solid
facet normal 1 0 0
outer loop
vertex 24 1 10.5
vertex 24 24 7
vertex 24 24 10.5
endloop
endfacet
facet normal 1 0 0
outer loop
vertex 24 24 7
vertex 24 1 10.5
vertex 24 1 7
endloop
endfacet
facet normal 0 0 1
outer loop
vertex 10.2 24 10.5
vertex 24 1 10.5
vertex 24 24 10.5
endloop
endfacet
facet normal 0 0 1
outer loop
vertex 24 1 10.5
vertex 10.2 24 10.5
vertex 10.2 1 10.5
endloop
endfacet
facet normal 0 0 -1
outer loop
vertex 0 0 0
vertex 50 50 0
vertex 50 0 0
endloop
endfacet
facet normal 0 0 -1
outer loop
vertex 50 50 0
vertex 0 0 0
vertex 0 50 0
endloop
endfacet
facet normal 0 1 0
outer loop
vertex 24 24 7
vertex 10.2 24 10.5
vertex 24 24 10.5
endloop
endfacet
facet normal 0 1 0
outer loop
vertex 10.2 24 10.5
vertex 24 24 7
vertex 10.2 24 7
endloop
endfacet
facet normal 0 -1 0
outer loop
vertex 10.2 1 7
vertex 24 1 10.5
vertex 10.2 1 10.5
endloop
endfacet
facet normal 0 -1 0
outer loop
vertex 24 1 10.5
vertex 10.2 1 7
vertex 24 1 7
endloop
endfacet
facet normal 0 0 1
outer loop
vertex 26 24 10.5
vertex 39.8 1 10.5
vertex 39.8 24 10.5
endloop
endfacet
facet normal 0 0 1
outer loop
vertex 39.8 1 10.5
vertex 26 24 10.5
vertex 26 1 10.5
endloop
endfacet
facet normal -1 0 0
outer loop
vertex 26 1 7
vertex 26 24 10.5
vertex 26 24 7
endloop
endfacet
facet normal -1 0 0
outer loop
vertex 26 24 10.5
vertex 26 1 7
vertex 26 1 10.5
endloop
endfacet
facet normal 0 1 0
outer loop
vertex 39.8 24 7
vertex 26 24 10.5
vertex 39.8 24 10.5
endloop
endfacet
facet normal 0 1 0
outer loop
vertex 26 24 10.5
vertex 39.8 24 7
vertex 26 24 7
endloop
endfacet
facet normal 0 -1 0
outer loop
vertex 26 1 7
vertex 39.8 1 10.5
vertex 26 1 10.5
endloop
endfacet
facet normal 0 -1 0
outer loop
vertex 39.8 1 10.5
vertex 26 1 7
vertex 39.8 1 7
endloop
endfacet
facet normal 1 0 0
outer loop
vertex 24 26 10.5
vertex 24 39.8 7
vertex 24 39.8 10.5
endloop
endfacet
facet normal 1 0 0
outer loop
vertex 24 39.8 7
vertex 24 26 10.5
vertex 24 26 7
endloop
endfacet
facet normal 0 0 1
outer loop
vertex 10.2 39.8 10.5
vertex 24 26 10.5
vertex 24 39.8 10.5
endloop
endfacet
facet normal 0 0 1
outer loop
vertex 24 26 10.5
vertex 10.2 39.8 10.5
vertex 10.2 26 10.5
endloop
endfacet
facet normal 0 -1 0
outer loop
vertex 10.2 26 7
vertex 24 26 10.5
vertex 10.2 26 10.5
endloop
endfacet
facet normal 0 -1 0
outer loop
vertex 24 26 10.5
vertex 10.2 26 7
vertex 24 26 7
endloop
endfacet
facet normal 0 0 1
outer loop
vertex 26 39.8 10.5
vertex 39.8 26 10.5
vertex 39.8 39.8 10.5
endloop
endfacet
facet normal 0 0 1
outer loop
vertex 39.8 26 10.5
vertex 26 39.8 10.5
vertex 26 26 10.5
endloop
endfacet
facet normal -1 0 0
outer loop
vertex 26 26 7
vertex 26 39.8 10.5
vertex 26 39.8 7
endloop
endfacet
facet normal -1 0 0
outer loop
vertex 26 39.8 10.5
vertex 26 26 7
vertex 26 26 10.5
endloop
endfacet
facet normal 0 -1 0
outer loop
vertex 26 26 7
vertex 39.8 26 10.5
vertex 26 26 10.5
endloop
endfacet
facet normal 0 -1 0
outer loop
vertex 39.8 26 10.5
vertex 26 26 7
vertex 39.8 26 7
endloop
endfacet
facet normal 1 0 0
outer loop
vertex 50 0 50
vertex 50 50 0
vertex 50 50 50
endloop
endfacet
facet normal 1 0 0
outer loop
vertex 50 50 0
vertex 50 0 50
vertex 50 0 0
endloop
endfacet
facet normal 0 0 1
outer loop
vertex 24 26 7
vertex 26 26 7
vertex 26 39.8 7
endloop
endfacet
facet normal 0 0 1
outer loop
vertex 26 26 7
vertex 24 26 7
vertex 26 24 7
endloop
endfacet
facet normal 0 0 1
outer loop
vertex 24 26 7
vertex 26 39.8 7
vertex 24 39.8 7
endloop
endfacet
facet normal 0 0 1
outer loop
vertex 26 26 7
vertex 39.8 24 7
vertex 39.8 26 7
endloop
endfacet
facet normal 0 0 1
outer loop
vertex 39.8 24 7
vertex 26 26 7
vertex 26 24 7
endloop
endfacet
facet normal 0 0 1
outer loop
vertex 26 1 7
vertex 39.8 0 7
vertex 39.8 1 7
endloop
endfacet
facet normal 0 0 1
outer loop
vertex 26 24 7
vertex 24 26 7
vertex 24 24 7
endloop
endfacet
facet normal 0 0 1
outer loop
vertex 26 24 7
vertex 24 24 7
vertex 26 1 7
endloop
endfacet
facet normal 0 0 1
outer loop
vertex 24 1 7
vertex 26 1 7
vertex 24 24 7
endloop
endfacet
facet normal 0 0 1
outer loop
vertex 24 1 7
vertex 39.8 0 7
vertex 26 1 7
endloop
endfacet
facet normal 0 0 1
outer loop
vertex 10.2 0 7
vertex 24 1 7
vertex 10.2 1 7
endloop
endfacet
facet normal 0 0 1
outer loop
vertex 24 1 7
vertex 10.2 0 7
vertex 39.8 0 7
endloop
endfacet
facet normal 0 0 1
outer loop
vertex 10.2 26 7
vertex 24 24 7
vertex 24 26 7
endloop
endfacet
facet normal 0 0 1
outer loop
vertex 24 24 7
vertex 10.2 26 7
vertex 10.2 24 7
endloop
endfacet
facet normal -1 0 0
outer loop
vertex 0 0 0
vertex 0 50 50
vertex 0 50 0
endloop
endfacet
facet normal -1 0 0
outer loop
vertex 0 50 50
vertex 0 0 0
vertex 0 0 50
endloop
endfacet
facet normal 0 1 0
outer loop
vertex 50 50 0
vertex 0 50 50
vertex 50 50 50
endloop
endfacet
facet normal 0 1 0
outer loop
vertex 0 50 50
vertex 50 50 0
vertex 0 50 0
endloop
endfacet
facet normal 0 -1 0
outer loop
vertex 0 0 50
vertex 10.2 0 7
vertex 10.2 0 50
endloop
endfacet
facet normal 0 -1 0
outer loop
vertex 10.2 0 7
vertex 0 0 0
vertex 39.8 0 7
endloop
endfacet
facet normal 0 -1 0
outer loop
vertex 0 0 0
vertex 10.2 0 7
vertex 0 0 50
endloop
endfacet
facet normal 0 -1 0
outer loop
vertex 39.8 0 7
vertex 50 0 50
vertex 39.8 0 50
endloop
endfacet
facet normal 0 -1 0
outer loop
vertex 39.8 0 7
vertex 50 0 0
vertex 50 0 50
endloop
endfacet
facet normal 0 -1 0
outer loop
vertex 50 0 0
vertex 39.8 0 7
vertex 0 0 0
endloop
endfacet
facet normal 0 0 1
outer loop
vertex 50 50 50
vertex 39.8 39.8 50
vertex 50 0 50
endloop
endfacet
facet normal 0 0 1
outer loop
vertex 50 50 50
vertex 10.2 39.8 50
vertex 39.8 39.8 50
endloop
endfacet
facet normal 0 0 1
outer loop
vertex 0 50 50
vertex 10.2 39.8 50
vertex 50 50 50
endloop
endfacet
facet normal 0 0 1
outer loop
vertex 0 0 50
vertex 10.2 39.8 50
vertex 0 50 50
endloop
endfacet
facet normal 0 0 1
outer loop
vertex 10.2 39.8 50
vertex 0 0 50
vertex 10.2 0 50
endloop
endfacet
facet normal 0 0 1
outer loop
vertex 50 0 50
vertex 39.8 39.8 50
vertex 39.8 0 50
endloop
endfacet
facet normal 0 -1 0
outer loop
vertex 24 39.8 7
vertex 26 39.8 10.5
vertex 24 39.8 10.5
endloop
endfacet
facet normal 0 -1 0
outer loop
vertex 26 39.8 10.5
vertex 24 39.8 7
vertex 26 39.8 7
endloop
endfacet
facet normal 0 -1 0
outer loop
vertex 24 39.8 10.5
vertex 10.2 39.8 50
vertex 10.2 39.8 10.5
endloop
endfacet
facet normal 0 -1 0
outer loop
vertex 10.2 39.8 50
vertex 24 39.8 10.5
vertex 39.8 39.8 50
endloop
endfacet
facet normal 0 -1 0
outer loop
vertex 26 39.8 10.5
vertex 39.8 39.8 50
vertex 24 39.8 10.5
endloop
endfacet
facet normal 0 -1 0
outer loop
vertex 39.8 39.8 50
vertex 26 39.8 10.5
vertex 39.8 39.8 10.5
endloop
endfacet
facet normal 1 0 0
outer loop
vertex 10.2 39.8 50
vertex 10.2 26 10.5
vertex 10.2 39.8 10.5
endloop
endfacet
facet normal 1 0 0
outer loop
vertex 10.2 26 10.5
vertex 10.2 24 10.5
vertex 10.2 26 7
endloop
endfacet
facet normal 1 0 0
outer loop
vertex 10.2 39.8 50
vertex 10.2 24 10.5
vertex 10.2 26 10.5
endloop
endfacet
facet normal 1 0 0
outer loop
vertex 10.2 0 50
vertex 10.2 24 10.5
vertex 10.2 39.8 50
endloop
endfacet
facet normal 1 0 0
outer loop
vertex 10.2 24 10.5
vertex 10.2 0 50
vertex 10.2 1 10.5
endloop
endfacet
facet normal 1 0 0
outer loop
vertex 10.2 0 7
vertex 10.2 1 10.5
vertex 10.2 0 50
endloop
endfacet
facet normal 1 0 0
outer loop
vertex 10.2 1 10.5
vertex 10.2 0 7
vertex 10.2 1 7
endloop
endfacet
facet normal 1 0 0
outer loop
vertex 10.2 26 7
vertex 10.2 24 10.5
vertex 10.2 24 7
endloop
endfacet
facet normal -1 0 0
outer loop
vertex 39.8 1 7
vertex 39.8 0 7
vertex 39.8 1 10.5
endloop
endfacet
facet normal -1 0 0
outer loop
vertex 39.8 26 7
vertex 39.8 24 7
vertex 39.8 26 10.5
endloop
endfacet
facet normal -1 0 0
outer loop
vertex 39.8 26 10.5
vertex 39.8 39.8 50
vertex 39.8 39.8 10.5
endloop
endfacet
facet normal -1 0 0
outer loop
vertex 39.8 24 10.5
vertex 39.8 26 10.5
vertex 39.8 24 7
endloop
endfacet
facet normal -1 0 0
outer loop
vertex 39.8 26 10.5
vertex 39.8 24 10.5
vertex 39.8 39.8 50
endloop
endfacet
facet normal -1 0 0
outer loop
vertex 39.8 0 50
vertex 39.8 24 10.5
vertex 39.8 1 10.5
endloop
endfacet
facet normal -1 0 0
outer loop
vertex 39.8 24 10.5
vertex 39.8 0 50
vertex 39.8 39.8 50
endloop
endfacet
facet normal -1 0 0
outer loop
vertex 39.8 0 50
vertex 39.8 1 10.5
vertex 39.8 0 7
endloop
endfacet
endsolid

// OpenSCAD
color("LightGray") {
    translate([1,1,0]) cube([23,23,6+4.5]);
    translate([25+1,1,0]) cube([23,23,6+4.5]);
    translate([1,25+1,0]) cube([23,23,6+4.5]);
    translate([25+1,25+1,0]) cube([23,23,6+4.5]);
}
color("Grey") {
    cube([50,50,7]);
    translate([0,50-10.2,0]) cube([50,10.2,50]);
    translate([0,0,0]) cube([10.2,50,50]);
    translate([50-10.2,0,0]) cube([10.2,50,50]);
}
